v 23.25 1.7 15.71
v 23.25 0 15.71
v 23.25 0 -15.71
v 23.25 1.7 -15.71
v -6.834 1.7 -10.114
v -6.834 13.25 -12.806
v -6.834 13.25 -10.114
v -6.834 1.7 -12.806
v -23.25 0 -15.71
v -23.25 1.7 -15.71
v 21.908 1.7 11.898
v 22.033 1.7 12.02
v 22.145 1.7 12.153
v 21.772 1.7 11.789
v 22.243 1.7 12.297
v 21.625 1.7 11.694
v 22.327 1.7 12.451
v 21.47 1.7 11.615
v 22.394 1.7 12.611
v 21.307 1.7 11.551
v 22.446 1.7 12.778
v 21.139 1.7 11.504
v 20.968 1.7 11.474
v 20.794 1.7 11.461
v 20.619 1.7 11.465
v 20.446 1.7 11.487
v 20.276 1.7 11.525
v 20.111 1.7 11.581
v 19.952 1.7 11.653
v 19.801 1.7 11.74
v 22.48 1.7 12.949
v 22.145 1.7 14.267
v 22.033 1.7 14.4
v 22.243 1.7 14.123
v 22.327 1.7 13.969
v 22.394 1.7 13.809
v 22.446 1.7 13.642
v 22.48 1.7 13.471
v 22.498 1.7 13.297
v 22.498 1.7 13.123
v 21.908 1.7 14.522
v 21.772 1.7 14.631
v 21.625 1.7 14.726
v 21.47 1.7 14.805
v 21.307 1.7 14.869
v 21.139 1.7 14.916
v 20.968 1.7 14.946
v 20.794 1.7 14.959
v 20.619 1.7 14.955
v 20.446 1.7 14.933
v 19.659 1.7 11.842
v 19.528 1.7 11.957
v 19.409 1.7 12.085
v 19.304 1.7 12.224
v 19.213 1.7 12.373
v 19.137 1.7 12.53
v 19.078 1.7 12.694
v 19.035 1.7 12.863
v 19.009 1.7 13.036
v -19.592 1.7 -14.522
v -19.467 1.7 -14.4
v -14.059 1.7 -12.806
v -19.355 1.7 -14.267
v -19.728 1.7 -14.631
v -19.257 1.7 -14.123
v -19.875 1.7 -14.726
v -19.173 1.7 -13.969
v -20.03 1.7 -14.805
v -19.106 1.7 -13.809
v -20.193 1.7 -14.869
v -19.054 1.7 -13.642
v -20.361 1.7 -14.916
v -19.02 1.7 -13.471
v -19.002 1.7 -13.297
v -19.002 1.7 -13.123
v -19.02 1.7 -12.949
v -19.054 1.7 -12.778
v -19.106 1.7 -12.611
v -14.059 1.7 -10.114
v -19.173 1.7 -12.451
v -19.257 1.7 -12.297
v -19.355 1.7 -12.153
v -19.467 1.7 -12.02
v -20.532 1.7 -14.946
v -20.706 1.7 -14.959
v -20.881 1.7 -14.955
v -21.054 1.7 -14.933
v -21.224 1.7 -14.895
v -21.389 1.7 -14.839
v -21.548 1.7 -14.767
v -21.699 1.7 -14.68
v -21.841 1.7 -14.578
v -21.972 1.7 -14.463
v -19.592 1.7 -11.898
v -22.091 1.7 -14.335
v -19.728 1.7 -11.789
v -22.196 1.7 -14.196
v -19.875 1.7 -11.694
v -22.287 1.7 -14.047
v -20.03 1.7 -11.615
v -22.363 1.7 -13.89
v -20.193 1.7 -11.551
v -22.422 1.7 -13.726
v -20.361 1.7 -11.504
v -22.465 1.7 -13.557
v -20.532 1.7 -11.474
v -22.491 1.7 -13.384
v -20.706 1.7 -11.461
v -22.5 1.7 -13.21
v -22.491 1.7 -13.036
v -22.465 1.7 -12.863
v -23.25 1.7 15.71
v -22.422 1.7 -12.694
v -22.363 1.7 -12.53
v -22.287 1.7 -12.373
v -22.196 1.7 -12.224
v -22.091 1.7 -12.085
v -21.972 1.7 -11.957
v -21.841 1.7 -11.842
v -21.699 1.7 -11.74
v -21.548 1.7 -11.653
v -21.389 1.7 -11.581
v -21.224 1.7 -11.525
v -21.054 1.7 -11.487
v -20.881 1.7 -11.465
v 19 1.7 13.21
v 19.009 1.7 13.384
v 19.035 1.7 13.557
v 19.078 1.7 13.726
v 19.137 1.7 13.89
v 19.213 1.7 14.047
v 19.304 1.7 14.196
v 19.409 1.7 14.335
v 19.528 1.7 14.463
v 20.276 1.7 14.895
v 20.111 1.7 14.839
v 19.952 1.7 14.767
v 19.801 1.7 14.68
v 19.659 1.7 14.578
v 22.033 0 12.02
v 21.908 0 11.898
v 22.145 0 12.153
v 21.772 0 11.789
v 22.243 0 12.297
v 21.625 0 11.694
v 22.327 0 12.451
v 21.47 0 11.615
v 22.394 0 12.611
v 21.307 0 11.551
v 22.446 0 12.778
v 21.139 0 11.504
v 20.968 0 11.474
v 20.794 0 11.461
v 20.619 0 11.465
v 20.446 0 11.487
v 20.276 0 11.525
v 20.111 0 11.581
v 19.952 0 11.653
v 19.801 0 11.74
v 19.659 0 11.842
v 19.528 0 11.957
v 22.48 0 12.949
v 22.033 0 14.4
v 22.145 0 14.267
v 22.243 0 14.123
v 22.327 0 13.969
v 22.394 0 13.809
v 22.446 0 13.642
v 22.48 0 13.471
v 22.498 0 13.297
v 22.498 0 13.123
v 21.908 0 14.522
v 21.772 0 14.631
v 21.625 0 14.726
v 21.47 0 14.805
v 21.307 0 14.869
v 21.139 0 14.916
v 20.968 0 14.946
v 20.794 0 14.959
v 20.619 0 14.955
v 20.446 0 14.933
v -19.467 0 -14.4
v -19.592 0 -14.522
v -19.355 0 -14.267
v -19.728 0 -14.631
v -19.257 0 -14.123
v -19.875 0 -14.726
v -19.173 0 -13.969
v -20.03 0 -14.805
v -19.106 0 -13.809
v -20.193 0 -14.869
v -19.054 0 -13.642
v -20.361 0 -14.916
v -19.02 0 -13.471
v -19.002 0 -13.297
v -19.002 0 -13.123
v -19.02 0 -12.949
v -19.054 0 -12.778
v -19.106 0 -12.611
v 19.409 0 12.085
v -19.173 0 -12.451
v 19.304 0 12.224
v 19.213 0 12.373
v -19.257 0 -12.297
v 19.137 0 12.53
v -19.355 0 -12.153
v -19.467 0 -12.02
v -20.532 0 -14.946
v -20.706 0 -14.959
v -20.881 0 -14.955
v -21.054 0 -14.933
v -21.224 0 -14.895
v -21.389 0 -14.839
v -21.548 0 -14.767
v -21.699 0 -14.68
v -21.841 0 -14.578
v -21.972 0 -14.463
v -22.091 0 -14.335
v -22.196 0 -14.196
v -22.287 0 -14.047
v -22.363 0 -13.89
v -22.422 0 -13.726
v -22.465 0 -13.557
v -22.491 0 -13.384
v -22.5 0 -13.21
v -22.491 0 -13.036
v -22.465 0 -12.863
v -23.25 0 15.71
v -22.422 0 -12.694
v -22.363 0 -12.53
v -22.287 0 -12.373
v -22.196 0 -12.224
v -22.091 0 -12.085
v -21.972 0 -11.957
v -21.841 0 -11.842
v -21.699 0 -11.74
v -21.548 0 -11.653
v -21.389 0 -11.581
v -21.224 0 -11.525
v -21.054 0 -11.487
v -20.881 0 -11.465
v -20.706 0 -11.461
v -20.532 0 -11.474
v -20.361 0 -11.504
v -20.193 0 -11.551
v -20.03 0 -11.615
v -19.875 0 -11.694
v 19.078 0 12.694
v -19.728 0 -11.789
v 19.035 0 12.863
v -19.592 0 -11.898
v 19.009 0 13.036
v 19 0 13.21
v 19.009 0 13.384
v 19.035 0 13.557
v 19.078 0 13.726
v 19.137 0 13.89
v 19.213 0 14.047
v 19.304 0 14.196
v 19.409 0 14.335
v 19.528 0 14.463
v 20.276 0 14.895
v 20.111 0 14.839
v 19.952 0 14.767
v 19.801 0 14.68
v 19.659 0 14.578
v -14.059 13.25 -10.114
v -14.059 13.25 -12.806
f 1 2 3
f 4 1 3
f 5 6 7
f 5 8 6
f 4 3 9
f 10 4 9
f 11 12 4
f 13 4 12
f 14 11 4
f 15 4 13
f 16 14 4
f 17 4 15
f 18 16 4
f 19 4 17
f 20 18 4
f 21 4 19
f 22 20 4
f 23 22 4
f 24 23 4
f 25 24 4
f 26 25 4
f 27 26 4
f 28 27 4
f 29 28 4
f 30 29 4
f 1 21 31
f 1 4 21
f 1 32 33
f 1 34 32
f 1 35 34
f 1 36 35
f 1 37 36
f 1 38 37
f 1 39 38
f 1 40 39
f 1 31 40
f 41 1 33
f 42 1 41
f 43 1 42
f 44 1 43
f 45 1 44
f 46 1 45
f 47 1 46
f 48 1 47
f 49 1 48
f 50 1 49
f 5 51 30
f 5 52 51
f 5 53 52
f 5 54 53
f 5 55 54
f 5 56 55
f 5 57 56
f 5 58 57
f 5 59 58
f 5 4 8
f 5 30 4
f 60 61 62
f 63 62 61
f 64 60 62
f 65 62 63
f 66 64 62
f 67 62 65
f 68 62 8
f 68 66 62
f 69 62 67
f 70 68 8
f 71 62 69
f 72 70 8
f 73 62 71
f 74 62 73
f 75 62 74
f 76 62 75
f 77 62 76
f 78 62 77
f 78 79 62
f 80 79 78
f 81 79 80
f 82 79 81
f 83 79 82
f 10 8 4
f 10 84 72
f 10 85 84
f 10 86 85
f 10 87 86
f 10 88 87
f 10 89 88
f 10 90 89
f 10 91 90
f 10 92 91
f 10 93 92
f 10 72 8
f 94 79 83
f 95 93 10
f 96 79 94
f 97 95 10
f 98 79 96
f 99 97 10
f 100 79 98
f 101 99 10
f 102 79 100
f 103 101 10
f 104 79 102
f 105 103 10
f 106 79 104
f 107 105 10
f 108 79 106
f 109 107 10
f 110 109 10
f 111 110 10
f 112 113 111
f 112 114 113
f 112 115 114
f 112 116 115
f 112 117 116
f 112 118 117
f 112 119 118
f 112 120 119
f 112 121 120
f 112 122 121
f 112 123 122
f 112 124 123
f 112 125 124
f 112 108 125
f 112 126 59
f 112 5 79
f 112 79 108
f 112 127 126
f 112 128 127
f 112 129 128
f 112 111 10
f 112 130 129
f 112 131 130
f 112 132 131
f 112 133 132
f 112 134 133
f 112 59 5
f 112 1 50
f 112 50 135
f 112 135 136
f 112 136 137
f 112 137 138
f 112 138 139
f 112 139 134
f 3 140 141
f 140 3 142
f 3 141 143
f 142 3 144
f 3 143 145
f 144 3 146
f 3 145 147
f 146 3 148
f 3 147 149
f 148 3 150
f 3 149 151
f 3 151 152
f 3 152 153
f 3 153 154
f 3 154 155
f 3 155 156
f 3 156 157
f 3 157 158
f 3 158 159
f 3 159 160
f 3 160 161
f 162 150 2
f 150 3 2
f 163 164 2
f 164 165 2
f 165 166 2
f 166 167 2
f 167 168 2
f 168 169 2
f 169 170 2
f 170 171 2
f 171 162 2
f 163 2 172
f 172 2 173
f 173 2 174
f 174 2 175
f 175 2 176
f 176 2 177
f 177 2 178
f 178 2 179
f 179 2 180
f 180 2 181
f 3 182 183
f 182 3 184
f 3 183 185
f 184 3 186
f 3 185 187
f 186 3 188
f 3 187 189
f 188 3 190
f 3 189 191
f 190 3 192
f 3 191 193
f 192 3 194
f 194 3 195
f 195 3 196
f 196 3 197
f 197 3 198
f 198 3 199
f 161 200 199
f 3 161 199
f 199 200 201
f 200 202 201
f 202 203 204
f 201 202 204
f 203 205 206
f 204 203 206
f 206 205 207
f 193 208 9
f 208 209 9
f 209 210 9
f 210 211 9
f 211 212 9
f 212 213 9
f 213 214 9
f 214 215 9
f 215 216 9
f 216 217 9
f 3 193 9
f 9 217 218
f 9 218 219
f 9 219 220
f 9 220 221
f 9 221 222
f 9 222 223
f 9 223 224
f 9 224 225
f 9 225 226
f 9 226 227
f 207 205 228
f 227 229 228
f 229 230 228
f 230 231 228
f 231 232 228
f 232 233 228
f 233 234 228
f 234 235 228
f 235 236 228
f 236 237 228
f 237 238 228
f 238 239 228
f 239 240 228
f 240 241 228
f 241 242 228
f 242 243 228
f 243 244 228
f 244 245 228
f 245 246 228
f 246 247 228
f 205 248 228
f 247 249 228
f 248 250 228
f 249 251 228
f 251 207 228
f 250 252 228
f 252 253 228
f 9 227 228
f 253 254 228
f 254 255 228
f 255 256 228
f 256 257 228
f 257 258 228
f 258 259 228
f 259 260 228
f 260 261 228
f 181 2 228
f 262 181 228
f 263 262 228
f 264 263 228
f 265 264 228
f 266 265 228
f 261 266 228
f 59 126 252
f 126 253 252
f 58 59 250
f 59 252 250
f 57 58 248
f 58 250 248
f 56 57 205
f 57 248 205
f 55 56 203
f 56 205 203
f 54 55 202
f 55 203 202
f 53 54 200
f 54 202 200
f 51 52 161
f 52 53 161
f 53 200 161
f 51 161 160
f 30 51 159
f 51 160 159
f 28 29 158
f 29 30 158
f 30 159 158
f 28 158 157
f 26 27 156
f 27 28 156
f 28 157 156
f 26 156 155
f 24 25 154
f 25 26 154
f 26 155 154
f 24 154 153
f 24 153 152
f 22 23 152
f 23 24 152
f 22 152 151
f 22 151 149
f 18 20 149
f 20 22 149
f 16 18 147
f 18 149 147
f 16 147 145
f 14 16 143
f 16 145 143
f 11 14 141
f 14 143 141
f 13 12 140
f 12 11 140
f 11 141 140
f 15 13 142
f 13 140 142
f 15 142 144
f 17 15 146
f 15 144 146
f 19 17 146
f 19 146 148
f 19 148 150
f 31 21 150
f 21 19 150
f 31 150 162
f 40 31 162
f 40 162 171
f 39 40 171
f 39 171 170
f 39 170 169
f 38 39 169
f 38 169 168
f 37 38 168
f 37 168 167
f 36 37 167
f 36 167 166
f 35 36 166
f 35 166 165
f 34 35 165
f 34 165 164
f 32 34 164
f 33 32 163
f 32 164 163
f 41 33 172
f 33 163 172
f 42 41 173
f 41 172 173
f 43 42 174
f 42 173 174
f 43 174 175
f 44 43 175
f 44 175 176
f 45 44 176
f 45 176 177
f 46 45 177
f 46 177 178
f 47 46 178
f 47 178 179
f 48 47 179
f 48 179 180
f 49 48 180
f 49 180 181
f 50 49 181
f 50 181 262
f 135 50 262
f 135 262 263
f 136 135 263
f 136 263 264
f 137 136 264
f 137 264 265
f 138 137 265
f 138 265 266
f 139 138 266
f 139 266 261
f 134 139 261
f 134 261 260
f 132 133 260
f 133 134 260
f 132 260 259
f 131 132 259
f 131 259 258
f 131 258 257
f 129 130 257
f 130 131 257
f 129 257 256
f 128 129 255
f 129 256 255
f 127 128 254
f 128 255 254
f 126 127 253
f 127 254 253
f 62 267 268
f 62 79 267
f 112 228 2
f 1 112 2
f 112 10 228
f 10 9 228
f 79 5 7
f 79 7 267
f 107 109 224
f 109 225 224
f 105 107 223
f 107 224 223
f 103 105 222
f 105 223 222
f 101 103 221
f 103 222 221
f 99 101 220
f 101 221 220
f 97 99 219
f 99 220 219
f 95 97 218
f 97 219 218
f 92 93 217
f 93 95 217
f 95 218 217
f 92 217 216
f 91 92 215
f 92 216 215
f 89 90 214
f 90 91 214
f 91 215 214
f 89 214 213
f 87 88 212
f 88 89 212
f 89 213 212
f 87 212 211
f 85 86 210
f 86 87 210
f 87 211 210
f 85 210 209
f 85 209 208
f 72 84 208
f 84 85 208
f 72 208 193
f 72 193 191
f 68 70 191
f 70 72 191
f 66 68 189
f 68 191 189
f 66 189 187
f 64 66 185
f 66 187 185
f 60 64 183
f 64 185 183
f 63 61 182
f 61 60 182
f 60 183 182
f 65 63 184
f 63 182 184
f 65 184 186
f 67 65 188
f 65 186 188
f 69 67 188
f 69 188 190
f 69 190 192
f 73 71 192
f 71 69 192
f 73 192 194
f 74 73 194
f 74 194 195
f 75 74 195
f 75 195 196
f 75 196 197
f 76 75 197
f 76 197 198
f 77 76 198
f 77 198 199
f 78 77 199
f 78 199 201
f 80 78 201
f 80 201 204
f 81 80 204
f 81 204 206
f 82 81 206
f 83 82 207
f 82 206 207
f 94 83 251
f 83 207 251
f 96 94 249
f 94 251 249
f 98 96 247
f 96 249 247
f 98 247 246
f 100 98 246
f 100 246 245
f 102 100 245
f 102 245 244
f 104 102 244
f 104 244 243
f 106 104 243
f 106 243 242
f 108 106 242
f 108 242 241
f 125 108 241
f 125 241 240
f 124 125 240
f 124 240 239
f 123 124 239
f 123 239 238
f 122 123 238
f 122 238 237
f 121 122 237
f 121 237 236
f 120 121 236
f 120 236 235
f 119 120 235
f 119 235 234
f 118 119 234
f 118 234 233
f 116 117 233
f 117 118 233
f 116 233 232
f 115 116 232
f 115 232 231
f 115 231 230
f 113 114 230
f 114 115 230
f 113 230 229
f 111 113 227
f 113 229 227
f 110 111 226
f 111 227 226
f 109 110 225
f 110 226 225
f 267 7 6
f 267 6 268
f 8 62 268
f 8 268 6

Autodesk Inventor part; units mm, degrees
ref_plane "YZ Plane" through (0, 0, 0) normal (1, 0, 0) x (0, 1, 0)
ref_plane "XZ Plane" through (0, 0, 0) normal (0, 1, 0) x (-1, 0, 0)
ref_plane "XY Plane" through (0, 0, 0) normal (0, 0, 1) x (1, 0, 0)
sketch "Sketch1" plane through (0, 0, 0) normal (0, 1, 0) x (-1, 0, 0)
  line L0 (23.25, 15.71) -> (-23.25, 15.71)
  line L1 (-23.25, 15.71) -> (-23.25, -15.71)
  line L2 (-23.25, -15.71) -> (23.25, -15.71)
  line L3 (23.25, -15.71) -> (23.25, 15.71)
  line L4 (23.25, 15.71) -> (-23.25, -15.71) construction
  line L5 (-23.25, 15.71) -> (23.25, -15.71) construction
  circle A0 centre (20.75, -13.21) radius 1.75
  circle A1 centre (-20.75, 13.21) radius 1.75
  line L6 (14.0587, -12.8063) -> (6.8338, -12.8063)
  line L7 (6.8338, -12.8063) -> (6.8338, -10.1137)
  line L8 (6.8338, -10.1137) -> (14.0587, -10.1137)
  line L9 (14.0587, -10.1137) -> (14.0587, -12.8063)
  line L10 (14.0587, -12.8063) -> (6.8338, -10.1137) construction
  line L11 (6.8338, -12.8063) -> (14.0587, -10.1137) construction
  point P0 (0, 0)
  point P1 (10.4463, -11.46)
  dimension "d0" = 46.5
  dimension "d1" = 31.42
  dimension "d2" = 3.5
  dimension "d3" = 3.5
  dimension "d4" = 2.5
  dimension "d5" = 2.5
  dimension "d6" = 2.5
  dimension "d7" = 2.5
extrude "Extrusion1" add sketch "Sketch1" along normal blind 1.7
extrude "Extrusion2" add sketch "Sketch1" along normal blind 13.25 contours L6 L7 L8 L9
sketch "Sketch2" plane through (0, 1.7, 0) normal (0, 1, 0) x (1, 0, 0)
  line L0 (-8.2019, 1.2171) -> (20.3938, 1.2171) construction
  line L1 (20.3938, 1.2171) -> (20.3938, -2.5127) construction
  line L2 (20.3938, -2.5127) -> (-8.2019, -2.5127) construction
  line L3 (-8.2019, -2.5127) -> (-8.2019, 1.2171) construction
  point P0 (0, 0)
sketch "Sketch3" plane through (23.25, 0, -15.71) normal (0, 0, -1) x (-1, 0, 0)
  point P0 (23.25, 0)
properties part number "Sound Detect"
